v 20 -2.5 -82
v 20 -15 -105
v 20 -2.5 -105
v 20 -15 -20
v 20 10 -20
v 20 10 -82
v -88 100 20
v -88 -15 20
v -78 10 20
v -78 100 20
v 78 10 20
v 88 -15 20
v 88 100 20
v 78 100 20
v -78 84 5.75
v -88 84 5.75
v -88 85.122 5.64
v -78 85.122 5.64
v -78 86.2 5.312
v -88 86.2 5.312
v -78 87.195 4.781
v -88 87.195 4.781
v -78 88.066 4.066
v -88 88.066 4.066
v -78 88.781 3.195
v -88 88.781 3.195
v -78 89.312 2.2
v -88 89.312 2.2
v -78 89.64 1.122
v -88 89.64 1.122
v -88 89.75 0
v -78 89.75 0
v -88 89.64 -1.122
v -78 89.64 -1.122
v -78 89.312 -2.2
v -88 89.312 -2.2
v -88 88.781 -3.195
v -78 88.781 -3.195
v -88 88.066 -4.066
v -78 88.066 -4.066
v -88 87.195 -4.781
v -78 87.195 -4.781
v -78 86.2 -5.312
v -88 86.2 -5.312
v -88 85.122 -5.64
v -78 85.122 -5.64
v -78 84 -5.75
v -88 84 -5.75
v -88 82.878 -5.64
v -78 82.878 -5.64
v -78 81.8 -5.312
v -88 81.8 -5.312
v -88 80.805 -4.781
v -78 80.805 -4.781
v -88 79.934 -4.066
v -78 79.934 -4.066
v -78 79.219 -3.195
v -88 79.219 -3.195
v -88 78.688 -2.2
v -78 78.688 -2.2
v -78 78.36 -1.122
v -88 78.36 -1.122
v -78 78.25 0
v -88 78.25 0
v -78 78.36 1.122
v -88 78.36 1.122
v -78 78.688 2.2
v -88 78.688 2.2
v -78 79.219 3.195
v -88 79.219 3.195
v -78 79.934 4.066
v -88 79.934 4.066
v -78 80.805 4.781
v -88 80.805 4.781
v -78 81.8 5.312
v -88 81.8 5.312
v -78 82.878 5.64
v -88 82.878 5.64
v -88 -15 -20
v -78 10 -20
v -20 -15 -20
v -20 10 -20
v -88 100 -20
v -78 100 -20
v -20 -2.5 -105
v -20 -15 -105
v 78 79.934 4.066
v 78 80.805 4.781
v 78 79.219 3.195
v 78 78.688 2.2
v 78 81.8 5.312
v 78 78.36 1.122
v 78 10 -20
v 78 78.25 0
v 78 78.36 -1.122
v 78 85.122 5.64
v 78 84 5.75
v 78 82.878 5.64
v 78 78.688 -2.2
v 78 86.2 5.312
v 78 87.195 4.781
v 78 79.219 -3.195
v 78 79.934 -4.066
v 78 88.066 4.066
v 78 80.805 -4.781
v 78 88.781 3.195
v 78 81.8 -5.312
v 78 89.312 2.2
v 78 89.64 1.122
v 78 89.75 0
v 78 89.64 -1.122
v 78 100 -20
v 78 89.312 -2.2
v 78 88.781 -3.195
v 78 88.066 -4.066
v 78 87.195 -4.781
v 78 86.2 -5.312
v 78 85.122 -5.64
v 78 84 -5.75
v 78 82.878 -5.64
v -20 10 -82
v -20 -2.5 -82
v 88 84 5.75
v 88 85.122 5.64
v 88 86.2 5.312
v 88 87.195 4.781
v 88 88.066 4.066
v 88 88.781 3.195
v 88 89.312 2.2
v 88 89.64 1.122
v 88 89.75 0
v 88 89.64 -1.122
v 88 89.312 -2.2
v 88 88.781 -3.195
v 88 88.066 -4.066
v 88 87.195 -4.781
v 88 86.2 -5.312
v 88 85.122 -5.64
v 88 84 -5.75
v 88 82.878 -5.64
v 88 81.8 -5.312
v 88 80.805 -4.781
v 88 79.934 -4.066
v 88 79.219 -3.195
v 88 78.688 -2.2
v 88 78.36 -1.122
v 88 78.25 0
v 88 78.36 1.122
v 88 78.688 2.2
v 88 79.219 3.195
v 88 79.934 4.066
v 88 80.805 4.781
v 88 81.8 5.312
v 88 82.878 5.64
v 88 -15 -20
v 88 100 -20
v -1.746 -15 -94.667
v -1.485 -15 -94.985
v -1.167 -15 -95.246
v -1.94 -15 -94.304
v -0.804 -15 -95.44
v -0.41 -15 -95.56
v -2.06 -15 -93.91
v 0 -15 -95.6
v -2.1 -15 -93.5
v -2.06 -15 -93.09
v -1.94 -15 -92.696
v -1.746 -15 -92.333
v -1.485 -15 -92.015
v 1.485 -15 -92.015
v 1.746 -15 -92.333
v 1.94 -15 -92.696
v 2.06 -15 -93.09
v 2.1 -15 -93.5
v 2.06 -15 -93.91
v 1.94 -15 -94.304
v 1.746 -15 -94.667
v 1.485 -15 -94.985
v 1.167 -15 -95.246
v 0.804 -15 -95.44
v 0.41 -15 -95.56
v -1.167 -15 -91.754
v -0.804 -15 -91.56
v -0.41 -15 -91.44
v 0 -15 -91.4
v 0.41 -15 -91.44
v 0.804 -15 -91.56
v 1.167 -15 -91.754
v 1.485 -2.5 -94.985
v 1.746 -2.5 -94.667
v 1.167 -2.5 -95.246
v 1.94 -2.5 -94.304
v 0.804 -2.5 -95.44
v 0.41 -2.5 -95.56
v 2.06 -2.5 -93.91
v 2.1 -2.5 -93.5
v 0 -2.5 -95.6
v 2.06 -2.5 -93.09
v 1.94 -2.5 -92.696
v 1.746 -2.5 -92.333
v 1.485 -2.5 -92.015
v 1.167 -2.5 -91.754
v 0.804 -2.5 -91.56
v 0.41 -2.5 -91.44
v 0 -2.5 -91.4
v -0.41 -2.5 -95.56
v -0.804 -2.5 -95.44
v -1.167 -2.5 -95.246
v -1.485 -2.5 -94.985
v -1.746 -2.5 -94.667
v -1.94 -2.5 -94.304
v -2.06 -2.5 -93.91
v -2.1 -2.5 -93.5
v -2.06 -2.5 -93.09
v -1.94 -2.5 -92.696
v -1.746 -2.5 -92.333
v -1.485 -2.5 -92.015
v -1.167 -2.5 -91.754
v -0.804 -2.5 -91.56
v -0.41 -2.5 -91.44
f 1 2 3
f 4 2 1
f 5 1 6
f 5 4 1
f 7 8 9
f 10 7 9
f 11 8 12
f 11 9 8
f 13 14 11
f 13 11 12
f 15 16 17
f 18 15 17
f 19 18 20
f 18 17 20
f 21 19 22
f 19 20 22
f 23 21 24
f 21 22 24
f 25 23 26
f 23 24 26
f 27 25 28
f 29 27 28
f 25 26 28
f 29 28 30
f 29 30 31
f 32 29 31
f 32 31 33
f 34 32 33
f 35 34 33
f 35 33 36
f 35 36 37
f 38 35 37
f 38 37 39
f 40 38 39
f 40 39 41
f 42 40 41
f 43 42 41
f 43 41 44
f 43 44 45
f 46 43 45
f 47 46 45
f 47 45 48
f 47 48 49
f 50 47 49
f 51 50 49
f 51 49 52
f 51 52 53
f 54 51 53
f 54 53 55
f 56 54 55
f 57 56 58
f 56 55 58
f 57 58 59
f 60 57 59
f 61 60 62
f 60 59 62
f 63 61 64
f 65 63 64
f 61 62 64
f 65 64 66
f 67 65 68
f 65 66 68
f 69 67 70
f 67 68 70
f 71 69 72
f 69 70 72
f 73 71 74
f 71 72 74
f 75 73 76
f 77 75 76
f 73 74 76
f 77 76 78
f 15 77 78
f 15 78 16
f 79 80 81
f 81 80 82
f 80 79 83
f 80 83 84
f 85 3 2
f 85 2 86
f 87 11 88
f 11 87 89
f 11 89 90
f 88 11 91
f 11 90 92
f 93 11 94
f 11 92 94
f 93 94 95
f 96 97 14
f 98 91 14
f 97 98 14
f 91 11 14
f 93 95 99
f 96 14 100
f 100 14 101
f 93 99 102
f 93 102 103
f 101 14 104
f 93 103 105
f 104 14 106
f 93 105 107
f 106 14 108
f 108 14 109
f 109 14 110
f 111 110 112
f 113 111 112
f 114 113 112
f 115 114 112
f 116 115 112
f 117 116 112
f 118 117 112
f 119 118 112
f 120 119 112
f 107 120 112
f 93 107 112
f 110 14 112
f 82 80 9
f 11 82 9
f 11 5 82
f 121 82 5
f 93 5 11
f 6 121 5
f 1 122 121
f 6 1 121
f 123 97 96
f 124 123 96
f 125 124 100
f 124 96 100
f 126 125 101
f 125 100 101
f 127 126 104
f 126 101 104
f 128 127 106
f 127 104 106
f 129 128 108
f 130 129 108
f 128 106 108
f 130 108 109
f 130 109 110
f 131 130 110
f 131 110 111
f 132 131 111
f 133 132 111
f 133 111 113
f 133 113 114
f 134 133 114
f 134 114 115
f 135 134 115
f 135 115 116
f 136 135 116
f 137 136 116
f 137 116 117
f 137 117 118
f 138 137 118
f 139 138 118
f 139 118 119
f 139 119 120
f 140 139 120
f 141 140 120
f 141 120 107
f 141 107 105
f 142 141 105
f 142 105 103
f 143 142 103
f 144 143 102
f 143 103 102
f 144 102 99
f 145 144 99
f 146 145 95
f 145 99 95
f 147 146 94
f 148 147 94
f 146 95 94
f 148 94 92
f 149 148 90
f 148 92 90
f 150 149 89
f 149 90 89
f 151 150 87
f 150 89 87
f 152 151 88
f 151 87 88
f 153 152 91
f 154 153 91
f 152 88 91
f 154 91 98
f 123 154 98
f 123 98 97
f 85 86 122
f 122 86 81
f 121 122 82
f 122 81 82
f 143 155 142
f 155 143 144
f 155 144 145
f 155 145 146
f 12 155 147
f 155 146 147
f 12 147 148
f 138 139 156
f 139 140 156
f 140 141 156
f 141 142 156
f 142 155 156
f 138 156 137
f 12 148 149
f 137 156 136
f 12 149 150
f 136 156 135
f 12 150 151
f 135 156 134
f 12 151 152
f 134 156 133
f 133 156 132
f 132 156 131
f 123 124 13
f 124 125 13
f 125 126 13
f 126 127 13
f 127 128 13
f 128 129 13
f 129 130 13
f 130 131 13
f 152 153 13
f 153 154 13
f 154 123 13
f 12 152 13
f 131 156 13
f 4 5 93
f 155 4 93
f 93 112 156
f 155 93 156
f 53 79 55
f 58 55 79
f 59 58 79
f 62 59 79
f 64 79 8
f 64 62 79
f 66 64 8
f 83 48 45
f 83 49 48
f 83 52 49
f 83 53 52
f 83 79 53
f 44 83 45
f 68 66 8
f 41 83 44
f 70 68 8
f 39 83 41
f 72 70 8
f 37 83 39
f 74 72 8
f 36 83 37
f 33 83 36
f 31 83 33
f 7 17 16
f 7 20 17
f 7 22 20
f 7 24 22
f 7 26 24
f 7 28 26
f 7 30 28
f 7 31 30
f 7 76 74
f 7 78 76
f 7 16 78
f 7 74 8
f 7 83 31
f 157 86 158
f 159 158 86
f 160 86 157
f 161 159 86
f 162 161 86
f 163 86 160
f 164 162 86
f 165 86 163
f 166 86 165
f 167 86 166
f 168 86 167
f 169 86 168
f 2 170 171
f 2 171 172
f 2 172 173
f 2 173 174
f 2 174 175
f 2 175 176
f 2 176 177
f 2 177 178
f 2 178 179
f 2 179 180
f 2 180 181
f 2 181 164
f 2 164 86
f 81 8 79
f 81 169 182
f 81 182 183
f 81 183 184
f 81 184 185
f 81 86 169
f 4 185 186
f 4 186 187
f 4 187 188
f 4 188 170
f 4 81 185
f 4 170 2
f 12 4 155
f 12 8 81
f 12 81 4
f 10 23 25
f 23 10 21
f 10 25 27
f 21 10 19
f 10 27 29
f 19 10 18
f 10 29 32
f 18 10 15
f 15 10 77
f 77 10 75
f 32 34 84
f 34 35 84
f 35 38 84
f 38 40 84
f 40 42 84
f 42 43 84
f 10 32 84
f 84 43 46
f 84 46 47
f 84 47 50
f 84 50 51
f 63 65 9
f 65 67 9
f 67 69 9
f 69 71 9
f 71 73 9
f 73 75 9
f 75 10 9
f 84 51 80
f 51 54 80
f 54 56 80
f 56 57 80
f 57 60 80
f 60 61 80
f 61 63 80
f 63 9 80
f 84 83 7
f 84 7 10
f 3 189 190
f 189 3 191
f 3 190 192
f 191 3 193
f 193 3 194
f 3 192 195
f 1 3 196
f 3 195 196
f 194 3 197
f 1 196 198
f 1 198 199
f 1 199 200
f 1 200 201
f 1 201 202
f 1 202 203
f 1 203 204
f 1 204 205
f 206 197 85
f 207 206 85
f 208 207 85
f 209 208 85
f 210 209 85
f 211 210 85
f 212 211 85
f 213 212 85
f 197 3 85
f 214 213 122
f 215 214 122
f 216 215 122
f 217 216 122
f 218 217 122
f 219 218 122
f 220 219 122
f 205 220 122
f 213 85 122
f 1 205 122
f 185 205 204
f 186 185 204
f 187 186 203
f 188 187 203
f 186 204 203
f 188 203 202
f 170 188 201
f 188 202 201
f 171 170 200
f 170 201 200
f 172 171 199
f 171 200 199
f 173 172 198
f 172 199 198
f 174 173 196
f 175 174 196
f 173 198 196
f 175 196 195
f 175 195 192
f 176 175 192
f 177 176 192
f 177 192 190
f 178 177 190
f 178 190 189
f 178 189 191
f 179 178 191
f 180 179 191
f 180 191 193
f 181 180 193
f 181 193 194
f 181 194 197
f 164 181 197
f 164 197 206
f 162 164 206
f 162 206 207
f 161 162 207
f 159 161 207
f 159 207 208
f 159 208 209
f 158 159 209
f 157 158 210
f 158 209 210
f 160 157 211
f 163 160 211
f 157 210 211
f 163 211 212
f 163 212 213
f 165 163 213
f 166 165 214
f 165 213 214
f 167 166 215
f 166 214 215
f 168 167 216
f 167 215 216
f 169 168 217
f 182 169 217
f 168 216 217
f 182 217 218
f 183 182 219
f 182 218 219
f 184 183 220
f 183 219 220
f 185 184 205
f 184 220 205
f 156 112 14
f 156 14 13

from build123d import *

# Parameters (mm, degrees)
SKETCH_1_W          = 156
SKETCH_1_H          = 40
EXTRUDE_1_DEPTH     = 20
SKETCH_2_W          = 40
SKETCH_2_H          = 20
EXTRUDE_2_DEPTH     = 10
SKETCH_3_W          = 40
SKETCH_3_H          = 20
EXTRUDE_3_DEPTH     = 10
SKETCH_4_W          = 10
SKETCH_4_H          = 40
EXTRUDE_4_DEPTH     = 80
SKETCH_5_W          = 10
SKETCH_5_H          = 40
EXTRUDE_5_DEPTH     = 80
SKETCH_6_R          = 5.75
CUT_EXTRUDE_1_DEPTH = 194
SKETCH_7_W          = 40
SKETCH_7_H          = 40
EXTRUDE_6_DEPTH     = 15
SKETCH_8_W          = 40
SKETCH_8_H          = 25
EXTRUDE_7_DEPTH     = 85
SKETCH_9_W          = 23
SKETCH_9_H          = 12.5
CUT_EXTRUDE_2_DEPTH = 43
SKETCH_10_R         = 2.1
CUT_EXTRUDE_3_DEPTH = 43
SKETCH_11_W         = 68
SKETCH_11_H         = 40
EXTRUDE_8_DEPTH     = 15
SKETCH_12_W         = 68
SKETCH_12_H         = 40
EXTRUDE_9_DEPTH     = 15
SKETCH_13_W         = 156
SKETCH_13_H         = 40
CUT_EXTRUDE_4_DEPTH = 10


with BuildPart() as part:
    # 草图1 → 凸台-拉伸1 (new body)
    with BuildSketch(Plane(origin=(0, 0, 0), x_dir=(1, 0, 0), z_dir=(0, 1, 0))):
        Rectangle(SKETCH_1_W, SKETCH_1_H)
    extrude(amount=EXTRUDE_1_DEPTH)



with BuildPart() as body_2:
    # 草图2 → 凸台-拉伸2 (new body)
    with BuildSketch(Plane.ZY.offset(78)):
        with Locations((0, 10)):
            Rectangle(SKETCH_2_W, SKETCH_2_H)
    extrude(amount=EXTRUDE_2_DEPTH)


with BuildPart() as body_3:
    # 草图3 → 凸台-拉伸3 (new body)
    with BuildSketch(Plane(origin=(78, 0, 0), x_dir=(0, 0, -1), z_dir=(1, 0, 0))):
        with Locations((0, 10)):
            Rectangle(SKETCH_3_W, SKETCH_3_H)
    extrude(amount=EXTRUDE_3_DEPTH)


with BuildPart() as part_1:
    add(part.part)

    add(body_2.part)  # 凸台-拉伸4 merges body 2
    # 草图4 → 凸台-拉伸4 (add)
    with BuildSketch(Plane(origin=(0, 20, 0), x_dir=(1, 0, 0), z_dir=(0, 1, 0))):
        with Locations((-83, 0)):
            Rectangle(SKETCH_4_W, SKETCH_4_H)
    extrude(amount=EXTRUDE_4_DEPTH)


    add(body_3.part)  # 凸台-拉伸5 merges body 3
    # 草图5 → 凸台-拉伸5 (add)
    with BuildSketch(Plane(origin=(0, 20, 0), x_dir=(1, 0, 0), z_dir=(0, 1, 0))):
        with Locations((83, 0)):
            Rectangle(SKETCH_5_W, SKETCH_5_H)
    extrude(amount=EXTRUDE_5_DEPTH)

    # 草图6 → 切除-拉伸1 (cut)
    with BuildSketch(Plane.ZY.offset(88)):
        with Locations((0, 84)):
            Circle(SKETCH_6_R)
    extrude(amount=-CUT_EXTRUDE_1_DEPTH, mode=Mode.SUBTRACT)

    # 草图7 → 凸台-拉伸6 (add)
    with BuildSketch(Plane.XZ):
        Rectangle(SKETCH_7_W, SKETCH_7_H)
    extrude(amount=EXTRUDE_6_DEPTH)

    # 草图8 → 凸台-拉伸7 (add)
    with BuildSketch(Plane(origin=(0, 0, -20), x_dir=(-1, 0, 0), z_dir=(0, 0, -1))):
        with Locations((0, -2.5)):
            Rectangle(SKETCH_8_W, SKETCH_8_H)
    extrude(amount=EXTRUDE_7_DEPTH)

    # 草图9 → 切除-拉伸2 (cut)
    with BuildSketch(Plane.ZY.offset(20)):
        with Locations((-93.5, 3.75)):
            Rectangle(SKETCH_9_W, SKETCH_9_H)
    extrude(amount=-CUT_EXTRUDE_2_DEPTH, mode=Mode.SUBTRACT)

    # 草图10 → 切除-拉伸3 (cut)
    with BuildSketch(Plane(origin=(0, -2.5, 0), x_dir=(1, 0, 0), z_dir=(0, 1, 0))):
        with Locations(Location((0, 93.5, 0), (0, 0, 270))):
            Circle(SKETCH_10_R)
    extrude(amount=-CUT_EXTRUDE_3_DEPTH, mode=Mode.SUBTRACT)

    # 草图11 → 凸台-拉伸8 (add)
    with BuildSketch(Plane.XZ):
        with Locations((54, 0)):
            Rectangle(SKETCH_11_W, SKETCH_11_H)
    extrude(amount=EXTRUDE_8_DEPTH)

    # 草图12 → 凸台-拉伸9 (add)
    with BuildSketch(Plane.XZ):
        with Locations((-54, 0)):
            Rectangle(SKETCH_12_W, SKETCH_12_H)
    extrude(amount=EXTRUDE_9_DEPTH)

    # 草图13 → 切除-拉伸4 (cut)
    with BuildSketch(Plane(origin=(0, 20, 0), x_dir=(1, 0, 0), z_dir=(0, 1, 0))):
        Rectangle(SKETCH_13_W, SKETCH_13_H)
    extrude(amount=-CUT_EXTRUDE_4_DEPTH, mode=Mode.SUBTRACT)


solid = part_1.part
